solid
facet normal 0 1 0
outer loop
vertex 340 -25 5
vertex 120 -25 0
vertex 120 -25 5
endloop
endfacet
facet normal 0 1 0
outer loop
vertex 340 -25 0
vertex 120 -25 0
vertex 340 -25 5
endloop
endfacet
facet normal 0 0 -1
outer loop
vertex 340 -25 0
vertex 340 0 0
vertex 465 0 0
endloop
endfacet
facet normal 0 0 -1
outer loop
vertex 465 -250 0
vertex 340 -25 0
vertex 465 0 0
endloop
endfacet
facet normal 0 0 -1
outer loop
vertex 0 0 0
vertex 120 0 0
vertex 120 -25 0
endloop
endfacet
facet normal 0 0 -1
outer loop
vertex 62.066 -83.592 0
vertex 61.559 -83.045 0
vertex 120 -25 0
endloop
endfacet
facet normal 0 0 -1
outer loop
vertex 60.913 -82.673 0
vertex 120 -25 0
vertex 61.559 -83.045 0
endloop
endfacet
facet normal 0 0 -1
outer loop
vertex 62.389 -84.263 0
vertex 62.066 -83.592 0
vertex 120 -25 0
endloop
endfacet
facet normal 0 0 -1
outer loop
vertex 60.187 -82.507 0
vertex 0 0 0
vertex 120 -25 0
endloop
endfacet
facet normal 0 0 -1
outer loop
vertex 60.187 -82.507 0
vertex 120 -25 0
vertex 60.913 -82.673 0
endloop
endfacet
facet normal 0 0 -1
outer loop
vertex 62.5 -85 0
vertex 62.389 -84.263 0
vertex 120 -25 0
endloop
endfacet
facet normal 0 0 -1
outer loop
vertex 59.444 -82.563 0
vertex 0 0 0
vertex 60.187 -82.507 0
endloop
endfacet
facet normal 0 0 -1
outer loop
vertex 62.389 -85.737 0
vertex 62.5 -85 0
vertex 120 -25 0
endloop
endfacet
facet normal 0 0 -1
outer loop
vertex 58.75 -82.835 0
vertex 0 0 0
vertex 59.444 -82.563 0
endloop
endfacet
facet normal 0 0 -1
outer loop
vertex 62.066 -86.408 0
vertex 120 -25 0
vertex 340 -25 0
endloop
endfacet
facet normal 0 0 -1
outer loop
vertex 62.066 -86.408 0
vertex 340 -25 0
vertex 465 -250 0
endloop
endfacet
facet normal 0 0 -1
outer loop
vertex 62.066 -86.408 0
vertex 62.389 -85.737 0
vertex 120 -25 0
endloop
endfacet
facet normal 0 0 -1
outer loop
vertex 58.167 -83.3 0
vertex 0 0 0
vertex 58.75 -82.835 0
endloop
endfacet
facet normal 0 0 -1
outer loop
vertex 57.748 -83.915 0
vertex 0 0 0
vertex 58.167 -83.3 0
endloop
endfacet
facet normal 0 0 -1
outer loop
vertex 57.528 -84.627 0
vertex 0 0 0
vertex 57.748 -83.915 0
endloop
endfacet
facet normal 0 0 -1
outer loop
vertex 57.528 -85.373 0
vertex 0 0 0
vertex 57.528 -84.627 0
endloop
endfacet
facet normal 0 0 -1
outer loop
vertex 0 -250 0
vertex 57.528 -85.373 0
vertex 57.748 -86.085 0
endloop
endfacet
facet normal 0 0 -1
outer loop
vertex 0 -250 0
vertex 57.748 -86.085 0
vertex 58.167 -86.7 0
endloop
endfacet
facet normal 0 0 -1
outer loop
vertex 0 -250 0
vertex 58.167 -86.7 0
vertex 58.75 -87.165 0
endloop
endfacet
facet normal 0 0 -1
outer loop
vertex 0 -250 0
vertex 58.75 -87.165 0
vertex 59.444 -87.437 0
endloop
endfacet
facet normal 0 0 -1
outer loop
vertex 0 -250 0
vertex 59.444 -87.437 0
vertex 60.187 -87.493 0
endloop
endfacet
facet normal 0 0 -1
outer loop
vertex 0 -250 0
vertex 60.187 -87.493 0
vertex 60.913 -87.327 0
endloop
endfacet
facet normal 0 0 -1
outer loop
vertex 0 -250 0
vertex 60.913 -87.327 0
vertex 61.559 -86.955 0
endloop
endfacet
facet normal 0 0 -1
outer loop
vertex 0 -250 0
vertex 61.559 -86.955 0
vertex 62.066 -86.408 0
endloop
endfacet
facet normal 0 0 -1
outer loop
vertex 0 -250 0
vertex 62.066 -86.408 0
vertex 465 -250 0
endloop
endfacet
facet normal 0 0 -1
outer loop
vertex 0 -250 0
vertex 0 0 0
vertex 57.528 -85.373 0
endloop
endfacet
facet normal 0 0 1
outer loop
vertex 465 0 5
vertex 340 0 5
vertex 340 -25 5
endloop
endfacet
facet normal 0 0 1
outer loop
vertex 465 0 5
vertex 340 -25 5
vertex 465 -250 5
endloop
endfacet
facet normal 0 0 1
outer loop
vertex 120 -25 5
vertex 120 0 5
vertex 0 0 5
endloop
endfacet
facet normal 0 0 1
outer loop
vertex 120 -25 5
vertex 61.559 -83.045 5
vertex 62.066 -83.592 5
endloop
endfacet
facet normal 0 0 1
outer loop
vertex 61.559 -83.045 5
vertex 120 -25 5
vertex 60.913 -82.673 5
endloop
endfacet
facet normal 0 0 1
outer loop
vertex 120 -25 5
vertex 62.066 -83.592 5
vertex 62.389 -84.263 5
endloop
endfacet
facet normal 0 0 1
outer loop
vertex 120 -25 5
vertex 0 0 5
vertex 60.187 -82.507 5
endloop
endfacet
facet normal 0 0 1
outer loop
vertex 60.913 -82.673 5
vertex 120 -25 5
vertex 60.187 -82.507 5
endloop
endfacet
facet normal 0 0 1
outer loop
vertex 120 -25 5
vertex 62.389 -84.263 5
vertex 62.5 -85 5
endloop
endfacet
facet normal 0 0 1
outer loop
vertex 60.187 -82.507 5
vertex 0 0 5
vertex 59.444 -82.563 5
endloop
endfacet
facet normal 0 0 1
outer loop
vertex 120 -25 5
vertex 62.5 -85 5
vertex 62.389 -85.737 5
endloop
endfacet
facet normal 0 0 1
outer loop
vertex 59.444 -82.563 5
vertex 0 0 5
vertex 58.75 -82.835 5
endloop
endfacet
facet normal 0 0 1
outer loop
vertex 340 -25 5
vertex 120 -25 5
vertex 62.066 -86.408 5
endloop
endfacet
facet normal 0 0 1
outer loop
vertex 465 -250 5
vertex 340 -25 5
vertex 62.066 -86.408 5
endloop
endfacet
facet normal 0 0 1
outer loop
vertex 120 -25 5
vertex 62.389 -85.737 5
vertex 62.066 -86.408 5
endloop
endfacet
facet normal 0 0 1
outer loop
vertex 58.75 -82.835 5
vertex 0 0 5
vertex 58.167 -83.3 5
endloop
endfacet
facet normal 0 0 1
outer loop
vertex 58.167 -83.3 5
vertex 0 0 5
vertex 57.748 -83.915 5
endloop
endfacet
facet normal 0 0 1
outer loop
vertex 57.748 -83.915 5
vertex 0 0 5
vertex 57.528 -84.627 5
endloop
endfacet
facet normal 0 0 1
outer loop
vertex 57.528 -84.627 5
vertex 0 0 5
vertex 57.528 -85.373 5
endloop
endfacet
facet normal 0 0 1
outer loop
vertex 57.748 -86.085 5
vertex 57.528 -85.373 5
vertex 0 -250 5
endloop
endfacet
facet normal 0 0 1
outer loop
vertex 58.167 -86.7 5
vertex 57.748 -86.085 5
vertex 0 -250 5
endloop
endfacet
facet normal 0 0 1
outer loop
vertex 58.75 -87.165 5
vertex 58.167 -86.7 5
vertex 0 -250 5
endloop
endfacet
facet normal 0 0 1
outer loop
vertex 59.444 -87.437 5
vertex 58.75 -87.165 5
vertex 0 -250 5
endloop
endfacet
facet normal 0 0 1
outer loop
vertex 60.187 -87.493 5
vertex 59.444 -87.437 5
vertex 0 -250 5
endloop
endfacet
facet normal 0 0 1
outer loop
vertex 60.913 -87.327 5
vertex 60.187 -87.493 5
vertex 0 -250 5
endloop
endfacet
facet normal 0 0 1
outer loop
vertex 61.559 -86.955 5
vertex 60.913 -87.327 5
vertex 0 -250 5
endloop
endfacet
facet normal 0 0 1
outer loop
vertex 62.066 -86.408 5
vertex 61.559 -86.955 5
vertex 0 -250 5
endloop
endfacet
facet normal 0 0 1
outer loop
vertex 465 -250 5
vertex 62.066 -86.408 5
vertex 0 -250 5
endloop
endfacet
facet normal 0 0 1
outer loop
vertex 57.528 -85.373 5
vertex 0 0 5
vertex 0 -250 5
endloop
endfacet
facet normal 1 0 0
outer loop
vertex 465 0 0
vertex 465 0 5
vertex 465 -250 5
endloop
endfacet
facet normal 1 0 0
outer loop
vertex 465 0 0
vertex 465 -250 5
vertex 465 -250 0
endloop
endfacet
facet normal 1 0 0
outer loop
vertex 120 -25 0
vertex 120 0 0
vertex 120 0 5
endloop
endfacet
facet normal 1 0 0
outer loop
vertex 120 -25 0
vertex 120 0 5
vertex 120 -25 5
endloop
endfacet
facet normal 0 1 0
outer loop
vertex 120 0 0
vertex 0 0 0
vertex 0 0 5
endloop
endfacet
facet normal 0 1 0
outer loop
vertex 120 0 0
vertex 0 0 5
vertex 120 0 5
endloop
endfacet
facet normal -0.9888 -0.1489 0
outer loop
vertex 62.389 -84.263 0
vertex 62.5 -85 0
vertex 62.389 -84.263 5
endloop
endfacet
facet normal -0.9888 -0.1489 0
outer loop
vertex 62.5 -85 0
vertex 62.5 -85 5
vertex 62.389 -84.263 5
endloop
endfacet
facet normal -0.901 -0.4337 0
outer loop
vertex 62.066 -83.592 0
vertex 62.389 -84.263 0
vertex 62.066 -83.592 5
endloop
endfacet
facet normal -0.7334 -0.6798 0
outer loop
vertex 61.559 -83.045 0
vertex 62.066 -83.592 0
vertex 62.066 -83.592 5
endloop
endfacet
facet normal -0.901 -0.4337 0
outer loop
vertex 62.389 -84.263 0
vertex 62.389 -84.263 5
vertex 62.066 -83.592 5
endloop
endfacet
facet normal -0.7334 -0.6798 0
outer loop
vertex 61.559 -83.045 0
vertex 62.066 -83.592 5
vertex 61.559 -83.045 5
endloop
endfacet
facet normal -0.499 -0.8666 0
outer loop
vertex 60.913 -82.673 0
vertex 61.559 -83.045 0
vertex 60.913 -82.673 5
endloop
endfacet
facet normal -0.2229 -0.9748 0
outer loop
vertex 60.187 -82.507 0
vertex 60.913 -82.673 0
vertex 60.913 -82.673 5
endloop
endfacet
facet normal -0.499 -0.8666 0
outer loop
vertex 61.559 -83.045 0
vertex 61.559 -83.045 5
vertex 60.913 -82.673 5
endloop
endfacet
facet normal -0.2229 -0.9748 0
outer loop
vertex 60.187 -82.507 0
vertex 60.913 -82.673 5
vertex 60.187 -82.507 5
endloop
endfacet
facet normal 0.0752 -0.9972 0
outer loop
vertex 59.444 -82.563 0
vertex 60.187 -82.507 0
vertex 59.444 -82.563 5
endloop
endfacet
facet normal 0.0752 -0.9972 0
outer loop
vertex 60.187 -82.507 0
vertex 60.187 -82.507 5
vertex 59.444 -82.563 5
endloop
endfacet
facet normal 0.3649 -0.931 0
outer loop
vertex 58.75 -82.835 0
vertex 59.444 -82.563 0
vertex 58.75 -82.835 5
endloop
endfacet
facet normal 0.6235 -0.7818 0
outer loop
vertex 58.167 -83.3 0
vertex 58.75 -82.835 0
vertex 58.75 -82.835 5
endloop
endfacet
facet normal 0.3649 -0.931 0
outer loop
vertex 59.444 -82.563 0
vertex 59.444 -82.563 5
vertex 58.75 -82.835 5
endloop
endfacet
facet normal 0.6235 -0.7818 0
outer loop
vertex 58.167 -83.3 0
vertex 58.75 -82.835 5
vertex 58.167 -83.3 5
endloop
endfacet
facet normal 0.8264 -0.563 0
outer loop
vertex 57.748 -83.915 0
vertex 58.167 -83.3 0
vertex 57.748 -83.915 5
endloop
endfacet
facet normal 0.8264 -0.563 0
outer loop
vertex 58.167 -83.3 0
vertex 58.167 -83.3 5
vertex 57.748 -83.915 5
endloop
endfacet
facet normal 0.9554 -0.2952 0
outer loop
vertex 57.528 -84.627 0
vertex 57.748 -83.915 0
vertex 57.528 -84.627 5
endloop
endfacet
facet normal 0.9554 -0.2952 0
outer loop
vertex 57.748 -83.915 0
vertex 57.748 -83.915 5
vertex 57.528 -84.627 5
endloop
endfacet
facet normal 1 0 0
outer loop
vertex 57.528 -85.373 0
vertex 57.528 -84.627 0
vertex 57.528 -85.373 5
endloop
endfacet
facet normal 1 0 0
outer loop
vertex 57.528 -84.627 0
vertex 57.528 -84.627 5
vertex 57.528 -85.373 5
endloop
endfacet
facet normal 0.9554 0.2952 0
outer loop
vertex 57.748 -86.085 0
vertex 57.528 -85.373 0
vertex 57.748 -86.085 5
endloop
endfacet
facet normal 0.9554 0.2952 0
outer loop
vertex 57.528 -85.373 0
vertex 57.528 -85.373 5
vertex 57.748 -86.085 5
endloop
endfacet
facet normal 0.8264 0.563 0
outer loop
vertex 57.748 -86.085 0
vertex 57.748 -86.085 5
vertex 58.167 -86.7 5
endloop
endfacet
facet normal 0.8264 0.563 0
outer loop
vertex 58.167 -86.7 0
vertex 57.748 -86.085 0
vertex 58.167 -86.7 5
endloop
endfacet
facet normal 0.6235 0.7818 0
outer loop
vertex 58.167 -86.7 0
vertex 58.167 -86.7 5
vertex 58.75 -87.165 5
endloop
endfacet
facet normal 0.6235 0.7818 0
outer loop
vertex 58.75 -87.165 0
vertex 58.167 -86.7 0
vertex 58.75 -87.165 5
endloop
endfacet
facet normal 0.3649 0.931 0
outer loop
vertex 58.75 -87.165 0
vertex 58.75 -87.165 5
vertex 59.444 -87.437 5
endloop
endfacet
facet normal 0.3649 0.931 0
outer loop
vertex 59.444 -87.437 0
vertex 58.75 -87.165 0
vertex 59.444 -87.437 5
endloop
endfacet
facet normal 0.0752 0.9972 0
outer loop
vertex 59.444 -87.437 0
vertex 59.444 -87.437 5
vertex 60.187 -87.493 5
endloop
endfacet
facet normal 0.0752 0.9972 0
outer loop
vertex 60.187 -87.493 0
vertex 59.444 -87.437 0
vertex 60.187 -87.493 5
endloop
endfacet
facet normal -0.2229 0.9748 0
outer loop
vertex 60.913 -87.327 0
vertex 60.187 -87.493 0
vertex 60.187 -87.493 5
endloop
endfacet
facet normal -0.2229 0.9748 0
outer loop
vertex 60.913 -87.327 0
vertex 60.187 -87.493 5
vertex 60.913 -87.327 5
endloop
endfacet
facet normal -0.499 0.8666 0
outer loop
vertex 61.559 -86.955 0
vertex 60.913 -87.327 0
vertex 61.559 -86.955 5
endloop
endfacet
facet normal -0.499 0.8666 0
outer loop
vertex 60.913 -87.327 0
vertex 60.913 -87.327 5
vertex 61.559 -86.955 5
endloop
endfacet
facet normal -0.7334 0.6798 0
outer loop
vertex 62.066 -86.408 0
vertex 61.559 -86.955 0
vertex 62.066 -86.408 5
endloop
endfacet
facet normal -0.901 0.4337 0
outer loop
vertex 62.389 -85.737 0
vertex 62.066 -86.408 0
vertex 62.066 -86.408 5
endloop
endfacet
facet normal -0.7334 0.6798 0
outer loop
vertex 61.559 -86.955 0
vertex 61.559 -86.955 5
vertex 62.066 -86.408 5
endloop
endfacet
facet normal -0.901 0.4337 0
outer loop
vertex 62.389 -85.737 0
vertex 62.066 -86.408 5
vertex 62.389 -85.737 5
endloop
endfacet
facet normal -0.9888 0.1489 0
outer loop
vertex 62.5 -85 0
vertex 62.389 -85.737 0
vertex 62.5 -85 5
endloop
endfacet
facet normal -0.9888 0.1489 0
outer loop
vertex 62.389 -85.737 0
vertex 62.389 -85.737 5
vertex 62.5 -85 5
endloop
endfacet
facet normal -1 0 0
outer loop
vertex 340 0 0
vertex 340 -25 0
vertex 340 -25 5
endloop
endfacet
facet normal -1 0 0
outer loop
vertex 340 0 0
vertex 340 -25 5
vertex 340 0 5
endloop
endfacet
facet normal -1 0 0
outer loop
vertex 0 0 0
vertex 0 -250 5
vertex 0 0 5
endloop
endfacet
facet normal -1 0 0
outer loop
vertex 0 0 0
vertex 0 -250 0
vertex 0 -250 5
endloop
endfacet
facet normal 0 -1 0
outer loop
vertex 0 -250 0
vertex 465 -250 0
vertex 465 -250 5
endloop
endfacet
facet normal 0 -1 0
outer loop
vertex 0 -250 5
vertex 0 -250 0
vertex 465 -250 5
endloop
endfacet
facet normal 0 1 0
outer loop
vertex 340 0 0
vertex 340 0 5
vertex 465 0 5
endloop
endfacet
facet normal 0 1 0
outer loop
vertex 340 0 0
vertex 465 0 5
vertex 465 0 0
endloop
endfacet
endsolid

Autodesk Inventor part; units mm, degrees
ref_plane "YZ Plane" through (0, 0, 0) normal (1, 0, 0) x (0, 1, 0)
ref_plane "XZ Plane" through (0, 0, 0) normal (0, 1, 0) x (-1, 0, 0)
ref_plane "XY Plane" through (0, 0, 0) normal (0, 0, 1) x (1, 0, 0)
sketch "Sketch1" plane through (0, 0, 0) normal (0, 0, 1) x (1, 0, 0)
  line L0 (0, 0) -> (460, 0)
  line L1 (460, 0) -> (460, -250)
  line L2 (460, -250) -> (0, -250)
  line L3 (0, -250) -> (0, 0)
  line L4 (0, 0) -> (120, 0)
  line L5 (120, 0) -> (120, -25)
  line L6 (120, -25) -> (320, -25)
  line L7 (320, -25) -> (340, -25)
  line L8 (340, -25) -> (340, 0)
  line L9 (340, 0) -> (460, 0)
extrude "Extrusion1" add sketch "Sketch1" along normal blind 5 contours L0 L5 L6 L7 L8 L1 L2 L3
sketch "Sketch2" plane through (0, 0, 5) normal (0, 0, 1) x (1, 0, 0)
  circle A0 centre (60, -85) radius 2.5
  point P0 (0, 0)
extrude "Extrusion2" cut sketch "Sketch2" against normal through all
sketch "Sketch3" plane through (460, -250, 0) normal (1, 0, 0) x (0, 0, -1)
  line L0 (-5, 250) -> (-5, 0) projected
  line L1 (0, 0) -> (-5, 0) projected
  line L2 (-5, 250) -> (0, 250)
  line L3 (0, 250) -> (0, 0)
  line L4 (0, 0) -> (-5, 0)
  line L5 (-5, 0) -> (-5, 250)
extrude "Extrusion3" add sketch "Sketch3" along normal blind 5
sketch "Sketch4" plane through (0, 0, 5) normal (0, 0, 1) x (1, 0, 0)
  point P0 (0, 0)
sketch "Sketch5" plane through (465, -250, 0) normal (1, 0, 0) x (0, 0, -1)
  line L0 (0, 250) -> (-5, 250) projected
  line L1 (0, 250) -> (0, 0) projected
  line L2 (-5, 250) -> (0, 250)
  line L3 (0, 250) -> (0, 0)
  line L4 (0, 0) -> (-5, 0)
  line L5 (-5, 0) -> (-5, 250)
properties part number "new back support 2"
